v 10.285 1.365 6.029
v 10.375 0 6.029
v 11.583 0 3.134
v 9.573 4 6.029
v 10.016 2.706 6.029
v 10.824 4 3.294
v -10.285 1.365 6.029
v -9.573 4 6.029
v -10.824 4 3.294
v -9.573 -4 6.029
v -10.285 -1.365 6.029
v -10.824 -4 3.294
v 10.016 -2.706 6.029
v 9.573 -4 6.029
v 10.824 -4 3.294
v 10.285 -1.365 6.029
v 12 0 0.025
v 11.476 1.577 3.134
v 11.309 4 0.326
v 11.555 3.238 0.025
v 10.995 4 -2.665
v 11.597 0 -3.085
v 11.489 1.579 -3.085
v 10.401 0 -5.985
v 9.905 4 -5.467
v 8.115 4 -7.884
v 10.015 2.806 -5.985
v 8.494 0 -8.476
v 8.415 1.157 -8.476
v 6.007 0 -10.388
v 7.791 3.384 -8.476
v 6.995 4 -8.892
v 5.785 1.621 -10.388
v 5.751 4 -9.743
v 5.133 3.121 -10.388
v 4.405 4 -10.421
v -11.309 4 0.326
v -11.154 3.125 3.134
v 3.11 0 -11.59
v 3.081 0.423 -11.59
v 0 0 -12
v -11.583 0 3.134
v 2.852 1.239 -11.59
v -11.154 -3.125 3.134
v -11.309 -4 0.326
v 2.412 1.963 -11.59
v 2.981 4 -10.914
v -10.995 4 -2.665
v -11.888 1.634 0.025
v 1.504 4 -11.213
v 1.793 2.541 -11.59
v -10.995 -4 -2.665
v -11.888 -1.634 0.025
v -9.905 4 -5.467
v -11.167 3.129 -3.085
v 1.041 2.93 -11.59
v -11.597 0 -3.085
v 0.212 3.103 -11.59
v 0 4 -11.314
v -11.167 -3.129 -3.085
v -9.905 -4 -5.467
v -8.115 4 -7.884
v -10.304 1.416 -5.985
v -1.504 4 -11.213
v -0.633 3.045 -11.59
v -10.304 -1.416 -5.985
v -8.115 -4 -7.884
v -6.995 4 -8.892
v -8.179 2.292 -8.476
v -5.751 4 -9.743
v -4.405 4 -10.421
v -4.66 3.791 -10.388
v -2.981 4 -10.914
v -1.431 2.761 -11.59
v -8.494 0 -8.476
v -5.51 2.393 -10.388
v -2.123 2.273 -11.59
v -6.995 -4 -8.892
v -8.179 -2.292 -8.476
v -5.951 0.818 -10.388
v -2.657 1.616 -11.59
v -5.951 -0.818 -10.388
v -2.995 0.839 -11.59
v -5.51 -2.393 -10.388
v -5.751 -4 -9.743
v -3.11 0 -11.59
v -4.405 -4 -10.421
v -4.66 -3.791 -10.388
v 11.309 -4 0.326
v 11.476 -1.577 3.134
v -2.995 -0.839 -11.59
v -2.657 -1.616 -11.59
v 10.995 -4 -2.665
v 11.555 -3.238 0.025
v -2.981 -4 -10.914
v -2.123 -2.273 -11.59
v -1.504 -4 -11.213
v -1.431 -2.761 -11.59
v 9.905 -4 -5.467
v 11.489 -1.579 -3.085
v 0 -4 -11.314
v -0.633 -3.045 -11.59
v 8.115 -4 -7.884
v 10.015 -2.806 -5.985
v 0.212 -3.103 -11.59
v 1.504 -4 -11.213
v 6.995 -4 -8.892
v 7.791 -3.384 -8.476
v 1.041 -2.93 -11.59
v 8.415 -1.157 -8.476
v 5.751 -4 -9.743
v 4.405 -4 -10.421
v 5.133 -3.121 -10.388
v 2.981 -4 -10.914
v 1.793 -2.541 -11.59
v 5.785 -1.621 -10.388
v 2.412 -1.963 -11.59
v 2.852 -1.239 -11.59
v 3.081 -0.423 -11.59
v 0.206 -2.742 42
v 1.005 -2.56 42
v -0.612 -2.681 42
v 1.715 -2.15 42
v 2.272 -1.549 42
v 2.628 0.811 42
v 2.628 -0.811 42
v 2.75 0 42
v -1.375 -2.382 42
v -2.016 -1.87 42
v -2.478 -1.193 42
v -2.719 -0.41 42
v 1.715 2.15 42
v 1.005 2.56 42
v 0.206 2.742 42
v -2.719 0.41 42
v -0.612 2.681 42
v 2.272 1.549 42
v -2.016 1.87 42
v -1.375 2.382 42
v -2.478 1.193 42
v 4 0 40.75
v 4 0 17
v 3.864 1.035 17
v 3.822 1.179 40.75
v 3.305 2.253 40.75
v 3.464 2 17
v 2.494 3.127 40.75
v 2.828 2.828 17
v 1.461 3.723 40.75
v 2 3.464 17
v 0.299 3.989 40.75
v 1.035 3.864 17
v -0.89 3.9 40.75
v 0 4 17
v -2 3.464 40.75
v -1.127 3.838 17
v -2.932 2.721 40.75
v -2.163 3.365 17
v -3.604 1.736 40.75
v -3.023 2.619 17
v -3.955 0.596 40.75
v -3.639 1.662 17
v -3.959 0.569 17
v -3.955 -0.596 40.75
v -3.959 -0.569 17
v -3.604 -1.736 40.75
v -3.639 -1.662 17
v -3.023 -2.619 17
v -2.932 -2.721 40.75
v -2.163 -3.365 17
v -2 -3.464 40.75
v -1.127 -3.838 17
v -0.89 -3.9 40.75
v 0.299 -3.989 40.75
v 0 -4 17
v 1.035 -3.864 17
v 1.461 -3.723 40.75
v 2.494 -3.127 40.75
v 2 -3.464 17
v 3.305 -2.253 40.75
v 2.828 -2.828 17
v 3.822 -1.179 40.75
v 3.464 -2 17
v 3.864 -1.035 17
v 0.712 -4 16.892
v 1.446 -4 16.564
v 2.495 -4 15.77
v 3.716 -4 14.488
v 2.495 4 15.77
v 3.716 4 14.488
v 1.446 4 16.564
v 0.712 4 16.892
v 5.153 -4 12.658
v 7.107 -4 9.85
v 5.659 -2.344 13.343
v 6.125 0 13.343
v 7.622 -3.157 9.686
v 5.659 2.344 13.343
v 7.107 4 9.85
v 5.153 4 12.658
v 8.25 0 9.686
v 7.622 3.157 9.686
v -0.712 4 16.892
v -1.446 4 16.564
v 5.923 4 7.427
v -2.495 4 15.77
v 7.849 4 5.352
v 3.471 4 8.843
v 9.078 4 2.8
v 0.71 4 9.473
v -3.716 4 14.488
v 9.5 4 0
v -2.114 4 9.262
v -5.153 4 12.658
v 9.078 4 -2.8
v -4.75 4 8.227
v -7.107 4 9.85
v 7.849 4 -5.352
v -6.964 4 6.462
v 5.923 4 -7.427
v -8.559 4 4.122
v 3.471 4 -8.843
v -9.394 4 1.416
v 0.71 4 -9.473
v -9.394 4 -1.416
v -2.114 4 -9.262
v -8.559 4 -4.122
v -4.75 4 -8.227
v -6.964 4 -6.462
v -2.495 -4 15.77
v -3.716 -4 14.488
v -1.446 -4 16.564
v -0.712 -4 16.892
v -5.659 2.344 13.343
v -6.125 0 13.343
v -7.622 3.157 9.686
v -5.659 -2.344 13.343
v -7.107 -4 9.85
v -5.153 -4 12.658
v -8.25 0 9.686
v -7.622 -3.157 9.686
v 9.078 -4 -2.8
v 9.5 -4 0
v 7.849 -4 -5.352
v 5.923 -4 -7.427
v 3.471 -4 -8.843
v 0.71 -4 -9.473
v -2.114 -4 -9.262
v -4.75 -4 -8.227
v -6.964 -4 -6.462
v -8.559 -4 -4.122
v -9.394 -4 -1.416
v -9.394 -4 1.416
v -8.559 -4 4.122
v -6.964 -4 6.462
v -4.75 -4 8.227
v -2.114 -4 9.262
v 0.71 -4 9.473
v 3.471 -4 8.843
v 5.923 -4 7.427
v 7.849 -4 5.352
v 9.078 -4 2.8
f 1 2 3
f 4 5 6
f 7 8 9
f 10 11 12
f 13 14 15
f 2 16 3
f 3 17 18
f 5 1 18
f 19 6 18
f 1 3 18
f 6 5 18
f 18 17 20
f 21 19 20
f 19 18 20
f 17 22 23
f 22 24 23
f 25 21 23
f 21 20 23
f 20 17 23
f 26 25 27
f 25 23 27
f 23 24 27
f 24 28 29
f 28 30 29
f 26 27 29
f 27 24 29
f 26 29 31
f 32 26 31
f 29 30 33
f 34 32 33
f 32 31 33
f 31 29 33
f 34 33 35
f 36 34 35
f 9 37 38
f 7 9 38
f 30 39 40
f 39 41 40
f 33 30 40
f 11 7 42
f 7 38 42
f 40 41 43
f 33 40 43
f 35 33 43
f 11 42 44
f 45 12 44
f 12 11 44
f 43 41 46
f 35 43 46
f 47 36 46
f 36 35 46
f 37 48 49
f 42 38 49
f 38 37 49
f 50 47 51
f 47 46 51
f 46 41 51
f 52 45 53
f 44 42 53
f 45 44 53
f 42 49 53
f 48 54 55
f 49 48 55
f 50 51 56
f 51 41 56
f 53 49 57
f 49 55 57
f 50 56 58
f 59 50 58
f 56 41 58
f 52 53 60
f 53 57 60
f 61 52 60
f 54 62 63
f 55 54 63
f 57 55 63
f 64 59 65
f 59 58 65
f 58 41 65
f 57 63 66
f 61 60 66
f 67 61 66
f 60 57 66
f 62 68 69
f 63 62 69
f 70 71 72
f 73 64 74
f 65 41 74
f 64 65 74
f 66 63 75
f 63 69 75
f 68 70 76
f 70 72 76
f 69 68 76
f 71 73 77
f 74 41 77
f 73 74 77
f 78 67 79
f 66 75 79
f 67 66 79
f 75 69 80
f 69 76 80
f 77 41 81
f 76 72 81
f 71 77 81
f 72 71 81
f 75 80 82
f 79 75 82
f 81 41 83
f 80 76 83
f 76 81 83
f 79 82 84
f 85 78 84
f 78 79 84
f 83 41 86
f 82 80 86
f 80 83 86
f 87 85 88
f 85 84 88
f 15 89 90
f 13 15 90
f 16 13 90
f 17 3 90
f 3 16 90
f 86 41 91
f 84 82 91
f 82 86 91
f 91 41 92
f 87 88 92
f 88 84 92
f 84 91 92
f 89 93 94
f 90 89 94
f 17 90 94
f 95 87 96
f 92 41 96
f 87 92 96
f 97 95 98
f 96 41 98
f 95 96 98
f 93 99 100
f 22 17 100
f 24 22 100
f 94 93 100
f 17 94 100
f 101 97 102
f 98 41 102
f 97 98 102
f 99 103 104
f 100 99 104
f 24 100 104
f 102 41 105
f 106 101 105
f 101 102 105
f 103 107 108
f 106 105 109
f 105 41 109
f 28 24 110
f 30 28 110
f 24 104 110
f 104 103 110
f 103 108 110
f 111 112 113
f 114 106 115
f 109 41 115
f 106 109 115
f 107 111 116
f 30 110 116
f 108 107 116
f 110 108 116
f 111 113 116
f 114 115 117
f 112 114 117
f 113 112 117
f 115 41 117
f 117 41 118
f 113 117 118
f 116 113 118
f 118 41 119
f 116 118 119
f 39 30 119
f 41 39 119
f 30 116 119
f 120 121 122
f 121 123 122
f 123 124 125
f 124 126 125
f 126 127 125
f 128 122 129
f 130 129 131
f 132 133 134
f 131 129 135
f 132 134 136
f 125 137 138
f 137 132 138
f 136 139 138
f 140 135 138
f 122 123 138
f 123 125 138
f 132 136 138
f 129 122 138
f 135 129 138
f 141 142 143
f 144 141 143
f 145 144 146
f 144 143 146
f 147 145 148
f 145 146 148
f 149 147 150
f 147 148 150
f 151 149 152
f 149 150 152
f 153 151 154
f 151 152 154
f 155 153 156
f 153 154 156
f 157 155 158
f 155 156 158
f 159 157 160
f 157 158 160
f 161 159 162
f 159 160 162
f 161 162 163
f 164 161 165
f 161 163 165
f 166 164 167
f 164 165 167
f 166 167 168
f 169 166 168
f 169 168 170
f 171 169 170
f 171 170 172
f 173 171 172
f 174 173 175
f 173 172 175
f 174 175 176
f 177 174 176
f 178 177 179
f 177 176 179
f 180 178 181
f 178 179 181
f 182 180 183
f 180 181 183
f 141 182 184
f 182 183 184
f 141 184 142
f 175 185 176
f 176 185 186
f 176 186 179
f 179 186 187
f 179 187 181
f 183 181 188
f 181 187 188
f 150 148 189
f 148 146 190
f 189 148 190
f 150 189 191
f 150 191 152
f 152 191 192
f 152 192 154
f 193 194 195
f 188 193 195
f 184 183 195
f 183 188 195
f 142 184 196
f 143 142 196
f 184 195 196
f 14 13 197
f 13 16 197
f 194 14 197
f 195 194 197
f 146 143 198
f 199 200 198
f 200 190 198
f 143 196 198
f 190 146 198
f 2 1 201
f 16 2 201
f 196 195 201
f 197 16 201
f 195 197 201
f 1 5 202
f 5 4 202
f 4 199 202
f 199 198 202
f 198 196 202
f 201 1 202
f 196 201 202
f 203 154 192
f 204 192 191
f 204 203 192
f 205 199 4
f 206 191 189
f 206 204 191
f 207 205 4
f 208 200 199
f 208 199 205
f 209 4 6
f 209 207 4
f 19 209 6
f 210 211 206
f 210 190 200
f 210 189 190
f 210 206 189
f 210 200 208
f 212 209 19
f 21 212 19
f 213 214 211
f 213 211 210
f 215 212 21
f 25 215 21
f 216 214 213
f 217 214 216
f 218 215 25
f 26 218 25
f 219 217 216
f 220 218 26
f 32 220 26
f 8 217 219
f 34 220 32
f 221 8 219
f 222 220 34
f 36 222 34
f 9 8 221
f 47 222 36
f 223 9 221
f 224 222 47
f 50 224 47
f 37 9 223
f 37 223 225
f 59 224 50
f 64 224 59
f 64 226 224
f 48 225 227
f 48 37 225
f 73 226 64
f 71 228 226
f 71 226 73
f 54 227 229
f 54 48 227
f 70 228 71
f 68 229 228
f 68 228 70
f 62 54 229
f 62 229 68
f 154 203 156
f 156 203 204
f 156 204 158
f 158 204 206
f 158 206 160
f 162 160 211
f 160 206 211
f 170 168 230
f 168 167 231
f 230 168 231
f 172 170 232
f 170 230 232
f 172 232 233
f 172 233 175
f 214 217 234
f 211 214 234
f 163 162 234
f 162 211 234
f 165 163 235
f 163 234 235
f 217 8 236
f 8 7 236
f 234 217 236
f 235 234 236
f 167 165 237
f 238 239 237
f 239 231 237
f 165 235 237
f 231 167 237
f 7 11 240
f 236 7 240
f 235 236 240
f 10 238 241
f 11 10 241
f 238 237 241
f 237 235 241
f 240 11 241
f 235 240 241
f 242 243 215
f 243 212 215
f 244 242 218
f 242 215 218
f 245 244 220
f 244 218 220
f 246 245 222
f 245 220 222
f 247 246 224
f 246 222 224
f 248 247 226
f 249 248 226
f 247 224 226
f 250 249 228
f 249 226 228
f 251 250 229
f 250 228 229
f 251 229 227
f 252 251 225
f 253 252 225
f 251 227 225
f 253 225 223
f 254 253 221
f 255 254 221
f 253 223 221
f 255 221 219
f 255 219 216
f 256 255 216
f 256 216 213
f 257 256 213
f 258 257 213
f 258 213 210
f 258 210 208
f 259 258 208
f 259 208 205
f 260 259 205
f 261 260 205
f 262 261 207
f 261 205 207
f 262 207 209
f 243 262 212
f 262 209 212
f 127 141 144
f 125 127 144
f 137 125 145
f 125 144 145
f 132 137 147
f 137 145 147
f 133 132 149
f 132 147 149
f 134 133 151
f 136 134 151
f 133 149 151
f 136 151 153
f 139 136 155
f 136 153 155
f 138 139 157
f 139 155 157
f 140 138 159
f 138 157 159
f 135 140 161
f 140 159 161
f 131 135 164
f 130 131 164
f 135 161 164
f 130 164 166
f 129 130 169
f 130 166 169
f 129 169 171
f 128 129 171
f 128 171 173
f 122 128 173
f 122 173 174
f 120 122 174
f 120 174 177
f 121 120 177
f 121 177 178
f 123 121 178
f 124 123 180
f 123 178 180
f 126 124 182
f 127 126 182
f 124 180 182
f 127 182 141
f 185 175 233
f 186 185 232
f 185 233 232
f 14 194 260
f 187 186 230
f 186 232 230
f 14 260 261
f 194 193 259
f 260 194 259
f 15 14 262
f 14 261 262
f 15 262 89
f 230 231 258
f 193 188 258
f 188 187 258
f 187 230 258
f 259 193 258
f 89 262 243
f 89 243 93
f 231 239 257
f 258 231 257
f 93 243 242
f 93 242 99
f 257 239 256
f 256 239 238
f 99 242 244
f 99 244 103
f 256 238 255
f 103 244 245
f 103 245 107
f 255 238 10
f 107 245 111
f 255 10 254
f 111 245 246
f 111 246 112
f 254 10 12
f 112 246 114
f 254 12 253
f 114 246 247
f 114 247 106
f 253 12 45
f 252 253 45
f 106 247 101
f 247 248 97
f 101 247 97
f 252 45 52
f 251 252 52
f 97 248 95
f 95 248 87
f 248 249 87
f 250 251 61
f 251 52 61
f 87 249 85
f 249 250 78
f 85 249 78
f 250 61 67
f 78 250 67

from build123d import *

# Parameters (mm, degrees)
SZKIC1_W                        = 4
SZKIC1_H                        = 25
WYTNIJ_WYCI_GNI_CIE1_DEPTH      = 13
WYTNIJ_WYCI_GNI_CIE1_DEPTH_BACK = 13
SZKIC3_R                        = 9.5
WYTNIJ_WYCI_GNI_CIE2_DEPTH      = 5
WYTNIJ_WYCI_GNI_CIE2_DEPTH_BACK = 5
SFAZOWANIE1_SIZE                = 1.25


with BuildPart() as part:
    # Szkic1 → Obrót1 (revolve)
    with BuildSketch(Plane(origin=(0, 0, 0), x_dir=(1, 0, 0), z_dir=(0, 1, 0))):
        with BuildLine():
            Line((0, 12), (0, -17))
            Line((0, -17), (4, -17))
            Line((4, -17), (10.37531088, -6.029338617))
            ThreePointArc((10.37531088, -6.029338617), (10.400770726, 5.985312715), (0, 12))
        make_face()
        with Locations((2, -29.5)):
            Rectangle(SZKIC1_W, SZKIC1_H)
    revolve(axis=Axis((0, 0, -26.043516498), (0, 0, 1)))

    # Szkic2 → Wytnij-wyciągnięcie1 (cut, two sides)
    with BuildSketch(Plane(origin=(0, 0, 0), x_dir=(0, 0, -1), z_dir=(1, 0, 0))) as wytnij_wyci_gni_cie1_sk:
        with BuildLine():
            Line((-17, 4), (11.313708499, 4))
            ThreePointArc((11.313708499, 4), (4.140324681, 11.263112871), (-6.029338617, 10.37531088))
            Line((-6.029338617, 10.37531088), (-17, 4))
        make_face()
        with BuildLine():
            Line((-17, -4), (11.313708499, -4))
            ThreePointArc((11.313708499, -4), (4.140324681, -11.263112871), (-6.029338617, -10.37531088))
            Line((-6.029338617, -10.37531088), (-17, -4))
        make_face()
    extrude(amount=WYTNIJ_WYCI_GNI_CIE1_DEPTH, mode=Mode.SUBTRACT)
    extrude(wytnij_wyci_gni_cie1_sk.sketch, amount=-WYTNIJ_WYCI_GNI_CIE1_DEPTH_BACK, mode=Mode.SUBTRACT)

    # Szkic3 → Wytnij-wyciągnięcie2 (cut, two sides)
    with BuildSketch(Plane(origin=(0, 0, 0), x_dir=(1, 0, 0), z_dir=(0, 1, 0))) as wytnij_wyci_gni_cie2_sk:
        Circle(SZKIC3_R)
    extrude(amount=WYTNIJ_WYCI_GNI_CIE2_DEPTH, mode=Mode.SUBTRACT)
    extrude(wytnij_wyci_gni_cie2_sk.sketch, amount=-WYTNIJ_WYCI_GNI_CIE2_DEPTH_BACK, mode=Mode.SUBTRACT)

    # Sfazowanie1
    sfazowanie1_edges = [part.edges().sort_by_distance(p)[0] for p in [
        (-4, 0, 42),
    ]]
    chamfer(sfazowanie1_edges, length=SFAZOWANIE1_SIZE)


solid = part.part
